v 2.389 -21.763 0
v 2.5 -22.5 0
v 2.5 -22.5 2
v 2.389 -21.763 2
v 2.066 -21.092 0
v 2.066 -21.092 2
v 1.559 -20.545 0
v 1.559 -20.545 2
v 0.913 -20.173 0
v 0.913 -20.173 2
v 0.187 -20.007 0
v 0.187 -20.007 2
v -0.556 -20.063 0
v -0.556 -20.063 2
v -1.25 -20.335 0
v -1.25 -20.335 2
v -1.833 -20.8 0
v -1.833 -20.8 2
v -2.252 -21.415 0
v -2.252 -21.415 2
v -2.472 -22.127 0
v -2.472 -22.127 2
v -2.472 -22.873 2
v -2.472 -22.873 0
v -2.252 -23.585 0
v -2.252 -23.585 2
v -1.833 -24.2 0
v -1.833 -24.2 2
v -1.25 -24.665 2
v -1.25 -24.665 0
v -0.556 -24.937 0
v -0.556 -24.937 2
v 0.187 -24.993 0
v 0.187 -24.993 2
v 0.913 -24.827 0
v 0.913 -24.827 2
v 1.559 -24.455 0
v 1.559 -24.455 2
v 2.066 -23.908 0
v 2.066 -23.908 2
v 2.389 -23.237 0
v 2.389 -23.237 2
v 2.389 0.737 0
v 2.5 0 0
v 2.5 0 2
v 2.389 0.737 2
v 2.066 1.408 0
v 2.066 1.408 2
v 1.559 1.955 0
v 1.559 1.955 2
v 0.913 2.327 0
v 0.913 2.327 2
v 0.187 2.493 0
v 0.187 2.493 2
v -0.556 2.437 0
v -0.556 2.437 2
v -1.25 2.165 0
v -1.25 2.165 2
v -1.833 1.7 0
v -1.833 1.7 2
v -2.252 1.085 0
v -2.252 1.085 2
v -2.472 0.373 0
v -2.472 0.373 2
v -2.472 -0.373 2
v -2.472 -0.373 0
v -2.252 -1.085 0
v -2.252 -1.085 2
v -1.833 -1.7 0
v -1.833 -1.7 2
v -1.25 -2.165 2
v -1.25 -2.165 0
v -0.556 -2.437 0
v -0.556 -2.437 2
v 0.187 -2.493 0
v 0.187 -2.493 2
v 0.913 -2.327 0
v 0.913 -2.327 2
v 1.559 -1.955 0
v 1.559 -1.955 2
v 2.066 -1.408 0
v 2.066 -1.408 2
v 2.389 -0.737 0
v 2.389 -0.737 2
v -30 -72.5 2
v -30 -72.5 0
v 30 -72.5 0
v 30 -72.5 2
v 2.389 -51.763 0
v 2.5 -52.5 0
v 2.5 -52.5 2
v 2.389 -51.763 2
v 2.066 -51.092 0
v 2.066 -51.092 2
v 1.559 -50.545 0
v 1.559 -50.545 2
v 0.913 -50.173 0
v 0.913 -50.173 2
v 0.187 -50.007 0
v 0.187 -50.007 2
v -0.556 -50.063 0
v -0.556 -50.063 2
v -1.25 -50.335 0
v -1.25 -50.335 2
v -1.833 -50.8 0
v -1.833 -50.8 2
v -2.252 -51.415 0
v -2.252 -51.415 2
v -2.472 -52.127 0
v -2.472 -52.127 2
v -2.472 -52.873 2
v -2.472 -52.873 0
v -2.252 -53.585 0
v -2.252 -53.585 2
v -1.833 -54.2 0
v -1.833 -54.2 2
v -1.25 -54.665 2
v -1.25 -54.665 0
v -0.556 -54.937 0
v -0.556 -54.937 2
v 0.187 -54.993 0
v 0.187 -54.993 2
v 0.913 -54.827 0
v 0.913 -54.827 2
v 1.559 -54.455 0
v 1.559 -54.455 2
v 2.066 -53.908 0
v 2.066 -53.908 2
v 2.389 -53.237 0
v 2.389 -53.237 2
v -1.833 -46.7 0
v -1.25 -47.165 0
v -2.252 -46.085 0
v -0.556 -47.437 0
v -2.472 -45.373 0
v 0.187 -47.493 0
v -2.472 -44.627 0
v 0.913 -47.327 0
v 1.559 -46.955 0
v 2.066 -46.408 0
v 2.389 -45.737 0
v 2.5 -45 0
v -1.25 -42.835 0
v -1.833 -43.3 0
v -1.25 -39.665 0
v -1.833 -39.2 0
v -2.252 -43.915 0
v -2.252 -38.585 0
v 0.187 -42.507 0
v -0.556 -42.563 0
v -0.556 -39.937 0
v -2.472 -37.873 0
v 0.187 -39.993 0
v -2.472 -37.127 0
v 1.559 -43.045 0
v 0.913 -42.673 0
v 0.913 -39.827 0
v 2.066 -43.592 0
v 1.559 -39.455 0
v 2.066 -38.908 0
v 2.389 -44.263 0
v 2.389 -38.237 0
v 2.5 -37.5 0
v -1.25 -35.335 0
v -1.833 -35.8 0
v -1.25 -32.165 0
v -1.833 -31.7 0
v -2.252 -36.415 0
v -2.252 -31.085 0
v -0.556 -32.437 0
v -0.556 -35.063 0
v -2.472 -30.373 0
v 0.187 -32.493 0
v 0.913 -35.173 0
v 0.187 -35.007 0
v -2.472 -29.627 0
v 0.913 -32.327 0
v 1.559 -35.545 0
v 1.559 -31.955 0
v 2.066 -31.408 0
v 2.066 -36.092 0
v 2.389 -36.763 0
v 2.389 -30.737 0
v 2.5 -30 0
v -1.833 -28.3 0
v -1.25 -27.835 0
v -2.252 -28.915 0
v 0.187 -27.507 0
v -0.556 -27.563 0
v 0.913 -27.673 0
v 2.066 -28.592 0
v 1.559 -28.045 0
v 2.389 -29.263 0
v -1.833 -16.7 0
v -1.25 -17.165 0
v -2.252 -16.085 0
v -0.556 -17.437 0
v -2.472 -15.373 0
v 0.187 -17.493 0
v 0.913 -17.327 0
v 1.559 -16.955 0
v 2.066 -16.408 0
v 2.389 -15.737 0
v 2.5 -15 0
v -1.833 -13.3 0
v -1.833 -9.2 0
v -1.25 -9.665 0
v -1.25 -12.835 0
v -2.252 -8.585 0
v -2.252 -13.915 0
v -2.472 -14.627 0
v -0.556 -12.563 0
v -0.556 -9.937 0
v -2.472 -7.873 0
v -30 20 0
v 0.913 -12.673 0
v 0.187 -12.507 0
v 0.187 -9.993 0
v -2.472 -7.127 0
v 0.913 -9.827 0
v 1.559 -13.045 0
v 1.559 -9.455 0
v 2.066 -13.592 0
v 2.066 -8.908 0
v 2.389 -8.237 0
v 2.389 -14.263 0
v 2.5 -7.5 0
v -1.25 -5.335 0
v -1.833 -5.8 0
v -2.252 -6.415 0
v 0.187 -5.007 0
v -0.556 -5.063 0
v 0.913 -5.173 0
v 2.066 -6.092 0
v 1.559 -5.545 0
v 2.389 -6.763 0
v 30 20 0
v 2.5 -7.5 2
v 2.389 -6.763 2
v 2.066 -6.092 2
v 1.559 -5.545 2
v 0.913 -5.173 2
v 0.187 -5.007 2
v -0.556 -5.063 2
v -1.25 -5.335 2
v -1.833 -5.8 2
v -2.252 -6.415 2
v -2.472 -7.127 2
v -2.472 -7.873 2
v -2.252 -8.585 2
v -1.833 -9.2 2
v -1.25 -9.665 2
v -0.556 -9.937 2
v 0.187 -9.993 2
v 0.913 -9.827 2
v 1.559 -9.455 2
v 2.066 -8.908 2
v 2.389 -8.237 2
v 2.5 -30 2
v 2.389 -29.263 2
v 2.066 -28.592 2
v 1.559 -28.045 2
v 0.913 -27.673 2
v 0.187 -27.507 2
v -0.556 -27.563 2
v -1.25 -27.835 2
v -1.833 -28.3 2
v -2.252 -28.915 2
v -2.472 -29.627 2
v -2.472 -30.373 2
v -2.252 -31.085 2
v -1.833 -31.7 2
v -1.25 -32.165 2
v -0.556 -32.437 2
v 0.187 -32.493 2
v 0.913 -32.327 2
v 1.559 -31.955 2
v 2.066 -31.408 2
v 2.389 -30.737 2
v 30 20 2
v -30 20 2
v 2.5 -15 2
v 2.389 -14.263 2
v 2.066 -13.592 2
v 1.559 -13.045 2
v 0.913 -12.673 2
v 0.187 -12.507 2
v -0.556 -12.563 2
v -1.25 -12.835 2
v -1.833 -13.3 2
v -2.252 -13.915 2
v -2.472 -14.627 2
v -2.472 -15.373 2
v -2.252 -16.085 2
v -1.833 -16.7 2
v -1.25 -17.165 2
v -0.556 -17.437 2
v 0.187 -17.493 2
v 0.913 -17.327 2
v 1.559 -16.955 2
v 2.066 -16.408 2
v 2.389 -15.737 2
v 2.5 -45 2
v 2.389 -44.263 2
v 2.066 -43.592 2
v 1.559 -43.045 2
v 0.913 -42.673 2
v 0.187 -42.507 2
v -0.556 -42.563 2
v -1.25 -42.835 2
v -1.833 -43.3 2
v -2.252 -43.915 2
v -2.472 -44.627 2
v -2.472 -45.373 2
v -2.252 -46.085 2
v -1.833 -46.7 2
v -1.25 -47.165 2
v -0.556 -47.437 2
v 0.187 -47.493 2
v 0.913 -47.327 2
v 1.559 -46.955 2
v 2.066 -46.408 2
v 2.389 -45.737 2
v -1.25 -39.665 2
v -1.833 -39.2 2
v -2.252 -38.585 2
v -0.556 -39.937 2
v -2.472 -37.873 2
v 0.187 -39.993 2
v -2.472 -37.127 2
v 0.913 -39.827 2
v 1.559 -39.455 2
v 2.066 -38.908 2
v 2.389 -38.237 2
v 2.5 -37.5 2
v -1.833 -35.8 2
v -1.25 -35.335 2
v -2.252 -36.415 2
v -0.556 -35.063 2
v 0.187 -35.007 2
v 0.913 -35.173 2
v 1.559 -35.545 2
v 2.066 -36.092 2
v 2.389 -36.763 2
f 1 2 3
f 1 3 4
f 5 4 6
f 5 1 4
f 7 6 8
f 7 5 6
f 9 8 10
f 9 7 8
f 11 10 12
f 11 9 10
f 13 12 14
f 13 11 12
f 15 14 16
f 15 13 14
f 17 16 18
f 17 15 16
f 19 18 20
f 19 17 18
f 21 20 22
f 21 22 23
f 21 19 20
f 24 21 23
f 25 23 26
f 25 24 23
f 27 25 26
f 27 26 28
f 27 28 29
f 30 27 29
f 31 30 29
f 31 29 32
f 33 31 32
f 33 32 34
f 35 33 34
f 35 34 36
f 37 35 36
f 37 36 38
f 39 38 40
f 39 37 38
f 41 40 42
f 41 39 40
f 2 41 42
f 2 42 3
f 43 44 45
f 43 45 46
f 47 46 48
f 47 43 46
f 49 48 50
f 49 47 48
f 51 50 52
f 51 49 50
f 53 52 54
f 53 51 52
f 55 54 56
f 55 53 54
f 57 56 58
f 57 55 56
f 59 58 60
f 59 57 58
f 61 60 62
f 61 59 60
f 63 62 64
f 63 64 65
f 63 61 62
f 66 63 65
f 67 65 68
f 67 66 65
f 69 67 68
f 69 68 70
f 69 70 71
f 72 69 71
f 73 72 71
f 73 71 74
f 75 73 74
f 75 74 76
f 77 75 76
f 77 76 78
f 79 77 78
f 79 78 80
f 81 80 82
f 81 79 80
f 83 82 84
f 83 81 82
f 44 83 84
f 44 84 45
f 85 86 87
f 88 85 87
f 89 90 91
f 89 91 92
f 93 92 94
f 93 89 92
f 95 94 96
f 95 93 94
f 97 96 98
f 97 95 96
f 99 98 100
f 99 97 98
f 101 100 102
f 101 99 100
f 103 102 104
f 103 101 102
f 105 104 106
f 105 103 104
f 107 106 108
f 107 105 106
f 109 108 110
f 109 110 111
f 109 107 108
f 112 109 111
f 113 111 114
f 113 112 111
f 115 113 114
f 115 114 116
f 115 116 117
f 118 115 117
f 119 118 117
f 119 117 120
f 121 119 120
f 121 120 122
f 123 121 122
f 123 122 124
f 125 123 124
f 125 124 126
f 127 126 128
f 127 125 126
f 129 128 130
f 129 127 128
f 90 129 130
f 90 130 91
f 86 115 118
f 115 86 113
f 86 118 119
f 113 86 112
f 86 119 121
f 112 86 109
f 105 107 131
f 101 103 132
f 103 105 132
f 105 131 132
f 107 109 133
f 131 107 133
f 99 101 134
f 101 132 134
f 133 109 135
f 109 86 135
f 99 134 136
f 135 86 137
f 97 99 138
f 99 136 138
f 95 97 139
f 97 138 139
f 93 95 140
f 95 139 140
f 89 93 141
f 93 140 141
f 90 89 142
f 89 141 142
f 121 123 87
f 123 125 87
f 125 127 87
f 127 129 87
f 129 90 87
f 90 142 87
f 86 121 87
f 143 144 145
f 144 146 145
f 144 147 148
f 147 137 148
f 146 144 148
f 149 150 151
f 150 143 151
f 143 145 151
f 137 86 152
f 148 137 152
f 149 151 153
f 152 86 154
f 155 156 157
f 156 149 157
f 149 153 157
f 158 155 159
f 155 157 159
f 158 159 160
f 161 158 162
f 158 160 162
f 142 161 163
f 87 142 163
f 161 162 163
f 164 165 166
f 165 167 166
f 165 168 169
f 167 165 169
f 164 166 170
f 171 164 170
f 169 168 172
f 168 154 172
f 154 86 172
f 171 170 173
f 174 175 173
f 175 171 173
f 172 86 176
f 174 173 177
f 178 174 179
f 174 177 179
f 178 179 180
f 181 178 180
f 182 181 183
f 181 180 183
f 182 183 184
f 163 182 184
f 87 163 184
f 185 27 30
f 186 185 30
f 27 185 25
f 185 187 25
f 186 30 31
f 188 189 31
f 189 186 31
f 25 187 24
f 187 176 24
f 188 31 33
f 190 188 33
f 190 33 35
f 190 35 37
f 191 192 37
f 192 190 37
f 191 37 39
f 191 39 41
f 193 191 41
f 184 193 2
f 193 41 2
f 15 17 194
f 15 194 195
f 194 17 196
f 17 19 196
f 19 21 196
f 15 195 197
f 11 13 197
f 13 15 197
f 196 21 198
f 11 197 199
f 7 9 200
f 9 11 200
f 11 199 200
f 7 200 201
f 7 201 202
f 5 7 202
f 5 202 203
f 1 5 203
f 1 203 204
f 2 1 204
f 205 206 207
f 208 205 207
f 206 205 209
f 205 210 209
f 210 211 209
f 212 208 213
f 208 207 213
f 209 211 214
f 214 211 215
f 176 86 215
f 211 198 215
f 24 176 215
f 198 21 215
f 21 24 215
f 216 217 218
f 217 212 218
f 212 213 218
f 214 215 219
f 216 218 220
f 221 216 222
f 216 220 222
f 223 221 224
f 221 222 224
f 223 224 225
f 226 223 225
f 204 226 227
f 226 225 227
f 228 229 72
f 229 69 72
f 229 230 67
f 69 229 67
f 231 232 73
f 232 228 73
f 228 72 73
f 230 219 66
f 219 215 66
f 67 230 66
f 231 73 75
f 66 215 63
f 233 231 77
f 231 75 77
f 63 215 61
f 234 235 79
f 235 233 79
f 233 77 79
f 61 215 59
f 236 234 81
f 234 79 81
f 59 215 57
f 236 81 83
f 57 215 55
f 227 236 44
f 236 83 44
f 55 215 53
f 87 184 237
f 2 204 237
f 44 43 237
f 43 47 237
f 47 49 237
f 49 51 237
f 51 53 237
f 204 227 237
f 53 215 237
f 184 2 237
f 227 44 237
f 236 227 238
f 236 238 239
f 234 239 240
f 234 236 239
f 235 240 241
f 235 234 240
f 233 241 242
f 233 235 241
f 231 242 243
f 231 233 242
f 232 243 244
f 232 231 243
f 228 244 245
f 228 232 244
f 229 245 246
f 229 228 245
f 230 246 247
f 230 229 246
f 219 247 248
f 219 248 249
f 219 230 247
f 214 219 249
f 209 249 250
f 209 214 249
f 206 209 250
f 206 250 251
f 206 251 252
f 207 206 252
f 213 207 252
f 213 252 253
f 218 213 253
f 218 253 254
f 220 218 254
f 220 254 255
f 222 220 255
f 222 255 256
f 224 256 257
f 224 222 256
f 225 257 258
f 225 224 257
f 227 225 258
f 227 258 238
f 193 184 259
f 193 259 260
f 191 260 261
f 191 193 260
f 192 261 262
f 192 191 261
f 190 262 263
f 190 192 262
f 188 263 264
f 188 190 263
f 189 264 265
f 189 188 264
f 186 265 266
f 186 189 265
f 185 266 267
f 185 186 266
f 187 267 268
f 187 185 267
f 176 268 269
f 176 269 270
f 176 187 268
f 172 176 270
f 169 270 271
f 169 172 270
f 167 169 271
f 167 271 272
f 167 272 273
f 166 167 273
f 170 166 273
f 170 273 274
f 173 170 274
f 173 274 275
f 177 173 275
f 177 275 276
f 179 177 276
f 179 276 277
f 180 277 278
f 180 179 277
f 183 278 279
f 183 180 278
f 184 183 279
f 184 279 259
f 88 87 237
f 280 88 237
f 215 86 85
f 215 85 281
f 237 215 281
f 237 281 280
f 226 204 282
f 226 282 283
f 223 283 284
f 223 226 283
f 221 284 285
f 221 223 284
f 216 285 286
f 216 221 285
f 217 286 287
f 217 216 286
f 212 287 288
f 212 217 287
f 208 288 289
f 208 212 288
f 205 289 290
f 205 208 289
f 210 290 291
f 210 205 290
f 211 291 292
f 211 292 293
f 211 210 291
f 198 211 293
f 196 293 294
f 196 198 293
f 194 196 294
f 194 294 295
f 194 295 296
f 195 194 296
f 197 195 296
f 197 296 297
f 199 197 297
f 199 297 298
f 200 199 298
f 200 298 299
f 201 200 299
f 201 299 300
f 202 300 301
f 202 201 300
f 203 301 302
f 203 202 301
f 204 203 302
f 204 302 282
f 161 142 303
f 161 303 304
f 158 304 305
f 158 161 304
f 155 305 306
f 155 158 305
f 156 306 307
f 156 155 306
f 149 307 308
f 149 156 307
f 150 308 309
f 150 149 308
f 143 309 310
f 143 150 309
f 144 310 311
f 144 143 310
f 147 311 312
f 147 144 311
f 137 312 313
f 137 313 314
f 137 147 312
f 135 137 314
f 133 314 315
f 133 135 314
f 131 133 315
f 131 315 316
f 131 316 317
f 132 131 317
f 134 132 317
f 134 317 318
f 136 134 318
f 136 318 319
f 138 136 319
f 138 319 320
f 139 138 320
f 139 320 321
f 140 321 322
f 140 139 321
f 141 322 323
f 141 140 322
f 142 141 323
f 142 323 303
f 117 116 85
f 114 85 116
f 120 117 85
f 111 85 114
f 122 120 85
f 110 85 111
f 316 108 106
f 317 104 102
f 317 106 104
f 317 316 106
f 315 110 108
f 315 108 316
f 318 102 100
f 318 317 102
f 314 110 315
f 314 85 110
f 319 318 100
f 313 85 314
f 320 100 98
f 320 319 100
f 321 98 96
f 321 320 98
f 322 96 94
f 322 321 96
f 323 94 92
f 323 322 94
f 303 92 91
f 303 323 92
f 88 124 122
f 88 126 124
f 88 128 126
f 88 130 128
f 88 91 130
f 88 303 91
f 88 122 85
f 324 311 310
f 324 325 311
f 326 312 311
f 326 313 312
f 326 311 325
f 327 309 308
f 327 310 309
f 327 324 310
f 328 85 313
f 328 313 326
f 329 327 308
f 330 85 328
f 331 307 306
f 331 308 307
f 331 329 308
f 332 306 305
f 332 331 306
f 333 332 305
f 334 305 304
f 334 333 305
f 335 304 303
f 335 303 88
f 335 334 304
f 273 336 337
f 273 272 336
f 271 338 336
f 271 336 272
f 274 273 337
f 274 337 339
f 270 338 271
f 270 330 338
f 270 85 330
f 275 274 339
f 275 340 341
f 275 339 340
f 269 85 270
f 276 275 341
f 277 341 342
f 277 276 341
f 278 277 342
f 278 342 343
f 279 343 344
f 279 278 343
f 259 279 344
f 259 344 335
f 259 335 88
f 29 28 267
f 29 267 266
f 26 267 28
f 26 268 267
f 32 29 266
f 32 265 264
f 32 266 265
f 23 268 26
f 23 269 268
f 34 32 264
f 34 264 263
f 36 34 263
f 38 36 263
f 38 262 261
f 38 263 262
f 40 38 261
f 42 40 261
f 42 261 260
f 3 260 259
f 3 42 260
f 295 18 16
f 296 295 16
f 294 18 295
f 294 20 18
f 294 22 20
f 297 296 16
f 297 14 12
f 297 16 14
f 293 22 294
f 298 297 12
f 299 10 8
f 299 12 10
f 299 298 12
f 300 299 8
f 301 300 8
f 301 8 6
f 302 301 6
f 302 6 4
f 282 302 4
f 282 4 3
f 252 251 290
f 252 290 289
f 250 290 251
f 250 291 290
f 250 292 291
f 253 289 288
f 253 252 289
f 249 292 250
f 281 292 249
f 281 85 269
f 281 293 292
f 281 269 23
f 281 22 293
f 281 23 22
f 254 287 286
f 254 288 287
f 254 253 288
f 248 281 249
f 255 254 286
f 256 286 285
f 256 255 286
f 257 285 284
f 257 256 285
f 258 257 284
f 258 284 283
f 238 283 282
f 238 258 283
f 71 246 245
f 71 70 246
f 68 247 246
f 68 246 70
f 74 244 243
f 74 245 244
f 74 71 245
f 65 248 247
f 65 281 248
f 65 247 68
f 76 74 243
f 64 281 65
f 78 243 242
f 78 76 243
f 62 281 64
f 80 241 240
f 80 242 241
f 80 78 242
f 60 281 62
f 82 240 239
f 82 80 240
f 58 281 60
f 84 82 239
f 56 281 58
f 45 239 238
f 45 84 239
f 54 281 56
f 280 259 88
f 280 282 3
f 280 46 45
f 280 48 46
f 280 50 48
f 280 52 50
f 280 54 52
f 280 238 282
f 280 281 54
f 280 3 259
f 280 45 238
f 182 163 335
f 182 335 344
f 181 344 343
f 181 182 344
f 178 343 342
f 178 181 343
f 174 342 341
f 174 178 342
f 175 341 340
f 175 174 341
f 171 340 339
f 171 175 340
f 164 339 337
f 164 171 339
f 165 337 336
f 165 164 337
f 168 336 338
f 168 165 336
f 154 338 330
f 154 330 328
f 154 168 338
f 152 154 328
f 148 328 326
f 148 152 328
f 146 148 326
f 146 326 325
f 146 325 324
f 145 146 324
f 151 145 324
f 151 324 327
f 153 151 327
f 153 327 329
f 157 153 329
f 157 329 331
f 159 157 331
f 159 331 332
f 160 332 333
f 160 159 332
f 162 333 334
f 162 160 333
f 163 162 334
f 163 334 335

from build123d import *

# Parameters (mm, degrees)
F0_W     = 60
F0_H     = 92.5
F0_R     = 2.5
F1_DEPTH = 2


with BuildPart() as f1:
    # F0 (on Top) → F1 (new body)
    with BuildSketch(Plane.XY):
        with Locations((0, -26.25)):
            Rectangle(F0_W, F0_H)
        with Locations((0, -52.5)):
            Circle(F0_R, mode=Mode.SUBTRACT)
        with Locations((0, -45)):
            Circle(F0_R, mode=Mode.SUBTRACT)
        with Locations((0, -37.5)):
            Circle(F0_R, mode=Mode.SUBTRACT)
        with Locations((0, -30)):
            Circle(F0_R, mode=Mode.SUBTRACT)
        with Locations((0, -22.5)):
            Circle(F0_R, mode=Mode.SUBTRACT)
        with Locations((0, -15)):
            Circle(F0_R, mode=Mode.SUBTRACT)
        with Locations((0, -7.5)):
            Circle(F0_R, mode=Mode.SUBTRACT)
        Circle(F0_R, mode=Mode.SUBTRACT)
    extrude(amount=F1_DEPTH)


solid = f1.part
